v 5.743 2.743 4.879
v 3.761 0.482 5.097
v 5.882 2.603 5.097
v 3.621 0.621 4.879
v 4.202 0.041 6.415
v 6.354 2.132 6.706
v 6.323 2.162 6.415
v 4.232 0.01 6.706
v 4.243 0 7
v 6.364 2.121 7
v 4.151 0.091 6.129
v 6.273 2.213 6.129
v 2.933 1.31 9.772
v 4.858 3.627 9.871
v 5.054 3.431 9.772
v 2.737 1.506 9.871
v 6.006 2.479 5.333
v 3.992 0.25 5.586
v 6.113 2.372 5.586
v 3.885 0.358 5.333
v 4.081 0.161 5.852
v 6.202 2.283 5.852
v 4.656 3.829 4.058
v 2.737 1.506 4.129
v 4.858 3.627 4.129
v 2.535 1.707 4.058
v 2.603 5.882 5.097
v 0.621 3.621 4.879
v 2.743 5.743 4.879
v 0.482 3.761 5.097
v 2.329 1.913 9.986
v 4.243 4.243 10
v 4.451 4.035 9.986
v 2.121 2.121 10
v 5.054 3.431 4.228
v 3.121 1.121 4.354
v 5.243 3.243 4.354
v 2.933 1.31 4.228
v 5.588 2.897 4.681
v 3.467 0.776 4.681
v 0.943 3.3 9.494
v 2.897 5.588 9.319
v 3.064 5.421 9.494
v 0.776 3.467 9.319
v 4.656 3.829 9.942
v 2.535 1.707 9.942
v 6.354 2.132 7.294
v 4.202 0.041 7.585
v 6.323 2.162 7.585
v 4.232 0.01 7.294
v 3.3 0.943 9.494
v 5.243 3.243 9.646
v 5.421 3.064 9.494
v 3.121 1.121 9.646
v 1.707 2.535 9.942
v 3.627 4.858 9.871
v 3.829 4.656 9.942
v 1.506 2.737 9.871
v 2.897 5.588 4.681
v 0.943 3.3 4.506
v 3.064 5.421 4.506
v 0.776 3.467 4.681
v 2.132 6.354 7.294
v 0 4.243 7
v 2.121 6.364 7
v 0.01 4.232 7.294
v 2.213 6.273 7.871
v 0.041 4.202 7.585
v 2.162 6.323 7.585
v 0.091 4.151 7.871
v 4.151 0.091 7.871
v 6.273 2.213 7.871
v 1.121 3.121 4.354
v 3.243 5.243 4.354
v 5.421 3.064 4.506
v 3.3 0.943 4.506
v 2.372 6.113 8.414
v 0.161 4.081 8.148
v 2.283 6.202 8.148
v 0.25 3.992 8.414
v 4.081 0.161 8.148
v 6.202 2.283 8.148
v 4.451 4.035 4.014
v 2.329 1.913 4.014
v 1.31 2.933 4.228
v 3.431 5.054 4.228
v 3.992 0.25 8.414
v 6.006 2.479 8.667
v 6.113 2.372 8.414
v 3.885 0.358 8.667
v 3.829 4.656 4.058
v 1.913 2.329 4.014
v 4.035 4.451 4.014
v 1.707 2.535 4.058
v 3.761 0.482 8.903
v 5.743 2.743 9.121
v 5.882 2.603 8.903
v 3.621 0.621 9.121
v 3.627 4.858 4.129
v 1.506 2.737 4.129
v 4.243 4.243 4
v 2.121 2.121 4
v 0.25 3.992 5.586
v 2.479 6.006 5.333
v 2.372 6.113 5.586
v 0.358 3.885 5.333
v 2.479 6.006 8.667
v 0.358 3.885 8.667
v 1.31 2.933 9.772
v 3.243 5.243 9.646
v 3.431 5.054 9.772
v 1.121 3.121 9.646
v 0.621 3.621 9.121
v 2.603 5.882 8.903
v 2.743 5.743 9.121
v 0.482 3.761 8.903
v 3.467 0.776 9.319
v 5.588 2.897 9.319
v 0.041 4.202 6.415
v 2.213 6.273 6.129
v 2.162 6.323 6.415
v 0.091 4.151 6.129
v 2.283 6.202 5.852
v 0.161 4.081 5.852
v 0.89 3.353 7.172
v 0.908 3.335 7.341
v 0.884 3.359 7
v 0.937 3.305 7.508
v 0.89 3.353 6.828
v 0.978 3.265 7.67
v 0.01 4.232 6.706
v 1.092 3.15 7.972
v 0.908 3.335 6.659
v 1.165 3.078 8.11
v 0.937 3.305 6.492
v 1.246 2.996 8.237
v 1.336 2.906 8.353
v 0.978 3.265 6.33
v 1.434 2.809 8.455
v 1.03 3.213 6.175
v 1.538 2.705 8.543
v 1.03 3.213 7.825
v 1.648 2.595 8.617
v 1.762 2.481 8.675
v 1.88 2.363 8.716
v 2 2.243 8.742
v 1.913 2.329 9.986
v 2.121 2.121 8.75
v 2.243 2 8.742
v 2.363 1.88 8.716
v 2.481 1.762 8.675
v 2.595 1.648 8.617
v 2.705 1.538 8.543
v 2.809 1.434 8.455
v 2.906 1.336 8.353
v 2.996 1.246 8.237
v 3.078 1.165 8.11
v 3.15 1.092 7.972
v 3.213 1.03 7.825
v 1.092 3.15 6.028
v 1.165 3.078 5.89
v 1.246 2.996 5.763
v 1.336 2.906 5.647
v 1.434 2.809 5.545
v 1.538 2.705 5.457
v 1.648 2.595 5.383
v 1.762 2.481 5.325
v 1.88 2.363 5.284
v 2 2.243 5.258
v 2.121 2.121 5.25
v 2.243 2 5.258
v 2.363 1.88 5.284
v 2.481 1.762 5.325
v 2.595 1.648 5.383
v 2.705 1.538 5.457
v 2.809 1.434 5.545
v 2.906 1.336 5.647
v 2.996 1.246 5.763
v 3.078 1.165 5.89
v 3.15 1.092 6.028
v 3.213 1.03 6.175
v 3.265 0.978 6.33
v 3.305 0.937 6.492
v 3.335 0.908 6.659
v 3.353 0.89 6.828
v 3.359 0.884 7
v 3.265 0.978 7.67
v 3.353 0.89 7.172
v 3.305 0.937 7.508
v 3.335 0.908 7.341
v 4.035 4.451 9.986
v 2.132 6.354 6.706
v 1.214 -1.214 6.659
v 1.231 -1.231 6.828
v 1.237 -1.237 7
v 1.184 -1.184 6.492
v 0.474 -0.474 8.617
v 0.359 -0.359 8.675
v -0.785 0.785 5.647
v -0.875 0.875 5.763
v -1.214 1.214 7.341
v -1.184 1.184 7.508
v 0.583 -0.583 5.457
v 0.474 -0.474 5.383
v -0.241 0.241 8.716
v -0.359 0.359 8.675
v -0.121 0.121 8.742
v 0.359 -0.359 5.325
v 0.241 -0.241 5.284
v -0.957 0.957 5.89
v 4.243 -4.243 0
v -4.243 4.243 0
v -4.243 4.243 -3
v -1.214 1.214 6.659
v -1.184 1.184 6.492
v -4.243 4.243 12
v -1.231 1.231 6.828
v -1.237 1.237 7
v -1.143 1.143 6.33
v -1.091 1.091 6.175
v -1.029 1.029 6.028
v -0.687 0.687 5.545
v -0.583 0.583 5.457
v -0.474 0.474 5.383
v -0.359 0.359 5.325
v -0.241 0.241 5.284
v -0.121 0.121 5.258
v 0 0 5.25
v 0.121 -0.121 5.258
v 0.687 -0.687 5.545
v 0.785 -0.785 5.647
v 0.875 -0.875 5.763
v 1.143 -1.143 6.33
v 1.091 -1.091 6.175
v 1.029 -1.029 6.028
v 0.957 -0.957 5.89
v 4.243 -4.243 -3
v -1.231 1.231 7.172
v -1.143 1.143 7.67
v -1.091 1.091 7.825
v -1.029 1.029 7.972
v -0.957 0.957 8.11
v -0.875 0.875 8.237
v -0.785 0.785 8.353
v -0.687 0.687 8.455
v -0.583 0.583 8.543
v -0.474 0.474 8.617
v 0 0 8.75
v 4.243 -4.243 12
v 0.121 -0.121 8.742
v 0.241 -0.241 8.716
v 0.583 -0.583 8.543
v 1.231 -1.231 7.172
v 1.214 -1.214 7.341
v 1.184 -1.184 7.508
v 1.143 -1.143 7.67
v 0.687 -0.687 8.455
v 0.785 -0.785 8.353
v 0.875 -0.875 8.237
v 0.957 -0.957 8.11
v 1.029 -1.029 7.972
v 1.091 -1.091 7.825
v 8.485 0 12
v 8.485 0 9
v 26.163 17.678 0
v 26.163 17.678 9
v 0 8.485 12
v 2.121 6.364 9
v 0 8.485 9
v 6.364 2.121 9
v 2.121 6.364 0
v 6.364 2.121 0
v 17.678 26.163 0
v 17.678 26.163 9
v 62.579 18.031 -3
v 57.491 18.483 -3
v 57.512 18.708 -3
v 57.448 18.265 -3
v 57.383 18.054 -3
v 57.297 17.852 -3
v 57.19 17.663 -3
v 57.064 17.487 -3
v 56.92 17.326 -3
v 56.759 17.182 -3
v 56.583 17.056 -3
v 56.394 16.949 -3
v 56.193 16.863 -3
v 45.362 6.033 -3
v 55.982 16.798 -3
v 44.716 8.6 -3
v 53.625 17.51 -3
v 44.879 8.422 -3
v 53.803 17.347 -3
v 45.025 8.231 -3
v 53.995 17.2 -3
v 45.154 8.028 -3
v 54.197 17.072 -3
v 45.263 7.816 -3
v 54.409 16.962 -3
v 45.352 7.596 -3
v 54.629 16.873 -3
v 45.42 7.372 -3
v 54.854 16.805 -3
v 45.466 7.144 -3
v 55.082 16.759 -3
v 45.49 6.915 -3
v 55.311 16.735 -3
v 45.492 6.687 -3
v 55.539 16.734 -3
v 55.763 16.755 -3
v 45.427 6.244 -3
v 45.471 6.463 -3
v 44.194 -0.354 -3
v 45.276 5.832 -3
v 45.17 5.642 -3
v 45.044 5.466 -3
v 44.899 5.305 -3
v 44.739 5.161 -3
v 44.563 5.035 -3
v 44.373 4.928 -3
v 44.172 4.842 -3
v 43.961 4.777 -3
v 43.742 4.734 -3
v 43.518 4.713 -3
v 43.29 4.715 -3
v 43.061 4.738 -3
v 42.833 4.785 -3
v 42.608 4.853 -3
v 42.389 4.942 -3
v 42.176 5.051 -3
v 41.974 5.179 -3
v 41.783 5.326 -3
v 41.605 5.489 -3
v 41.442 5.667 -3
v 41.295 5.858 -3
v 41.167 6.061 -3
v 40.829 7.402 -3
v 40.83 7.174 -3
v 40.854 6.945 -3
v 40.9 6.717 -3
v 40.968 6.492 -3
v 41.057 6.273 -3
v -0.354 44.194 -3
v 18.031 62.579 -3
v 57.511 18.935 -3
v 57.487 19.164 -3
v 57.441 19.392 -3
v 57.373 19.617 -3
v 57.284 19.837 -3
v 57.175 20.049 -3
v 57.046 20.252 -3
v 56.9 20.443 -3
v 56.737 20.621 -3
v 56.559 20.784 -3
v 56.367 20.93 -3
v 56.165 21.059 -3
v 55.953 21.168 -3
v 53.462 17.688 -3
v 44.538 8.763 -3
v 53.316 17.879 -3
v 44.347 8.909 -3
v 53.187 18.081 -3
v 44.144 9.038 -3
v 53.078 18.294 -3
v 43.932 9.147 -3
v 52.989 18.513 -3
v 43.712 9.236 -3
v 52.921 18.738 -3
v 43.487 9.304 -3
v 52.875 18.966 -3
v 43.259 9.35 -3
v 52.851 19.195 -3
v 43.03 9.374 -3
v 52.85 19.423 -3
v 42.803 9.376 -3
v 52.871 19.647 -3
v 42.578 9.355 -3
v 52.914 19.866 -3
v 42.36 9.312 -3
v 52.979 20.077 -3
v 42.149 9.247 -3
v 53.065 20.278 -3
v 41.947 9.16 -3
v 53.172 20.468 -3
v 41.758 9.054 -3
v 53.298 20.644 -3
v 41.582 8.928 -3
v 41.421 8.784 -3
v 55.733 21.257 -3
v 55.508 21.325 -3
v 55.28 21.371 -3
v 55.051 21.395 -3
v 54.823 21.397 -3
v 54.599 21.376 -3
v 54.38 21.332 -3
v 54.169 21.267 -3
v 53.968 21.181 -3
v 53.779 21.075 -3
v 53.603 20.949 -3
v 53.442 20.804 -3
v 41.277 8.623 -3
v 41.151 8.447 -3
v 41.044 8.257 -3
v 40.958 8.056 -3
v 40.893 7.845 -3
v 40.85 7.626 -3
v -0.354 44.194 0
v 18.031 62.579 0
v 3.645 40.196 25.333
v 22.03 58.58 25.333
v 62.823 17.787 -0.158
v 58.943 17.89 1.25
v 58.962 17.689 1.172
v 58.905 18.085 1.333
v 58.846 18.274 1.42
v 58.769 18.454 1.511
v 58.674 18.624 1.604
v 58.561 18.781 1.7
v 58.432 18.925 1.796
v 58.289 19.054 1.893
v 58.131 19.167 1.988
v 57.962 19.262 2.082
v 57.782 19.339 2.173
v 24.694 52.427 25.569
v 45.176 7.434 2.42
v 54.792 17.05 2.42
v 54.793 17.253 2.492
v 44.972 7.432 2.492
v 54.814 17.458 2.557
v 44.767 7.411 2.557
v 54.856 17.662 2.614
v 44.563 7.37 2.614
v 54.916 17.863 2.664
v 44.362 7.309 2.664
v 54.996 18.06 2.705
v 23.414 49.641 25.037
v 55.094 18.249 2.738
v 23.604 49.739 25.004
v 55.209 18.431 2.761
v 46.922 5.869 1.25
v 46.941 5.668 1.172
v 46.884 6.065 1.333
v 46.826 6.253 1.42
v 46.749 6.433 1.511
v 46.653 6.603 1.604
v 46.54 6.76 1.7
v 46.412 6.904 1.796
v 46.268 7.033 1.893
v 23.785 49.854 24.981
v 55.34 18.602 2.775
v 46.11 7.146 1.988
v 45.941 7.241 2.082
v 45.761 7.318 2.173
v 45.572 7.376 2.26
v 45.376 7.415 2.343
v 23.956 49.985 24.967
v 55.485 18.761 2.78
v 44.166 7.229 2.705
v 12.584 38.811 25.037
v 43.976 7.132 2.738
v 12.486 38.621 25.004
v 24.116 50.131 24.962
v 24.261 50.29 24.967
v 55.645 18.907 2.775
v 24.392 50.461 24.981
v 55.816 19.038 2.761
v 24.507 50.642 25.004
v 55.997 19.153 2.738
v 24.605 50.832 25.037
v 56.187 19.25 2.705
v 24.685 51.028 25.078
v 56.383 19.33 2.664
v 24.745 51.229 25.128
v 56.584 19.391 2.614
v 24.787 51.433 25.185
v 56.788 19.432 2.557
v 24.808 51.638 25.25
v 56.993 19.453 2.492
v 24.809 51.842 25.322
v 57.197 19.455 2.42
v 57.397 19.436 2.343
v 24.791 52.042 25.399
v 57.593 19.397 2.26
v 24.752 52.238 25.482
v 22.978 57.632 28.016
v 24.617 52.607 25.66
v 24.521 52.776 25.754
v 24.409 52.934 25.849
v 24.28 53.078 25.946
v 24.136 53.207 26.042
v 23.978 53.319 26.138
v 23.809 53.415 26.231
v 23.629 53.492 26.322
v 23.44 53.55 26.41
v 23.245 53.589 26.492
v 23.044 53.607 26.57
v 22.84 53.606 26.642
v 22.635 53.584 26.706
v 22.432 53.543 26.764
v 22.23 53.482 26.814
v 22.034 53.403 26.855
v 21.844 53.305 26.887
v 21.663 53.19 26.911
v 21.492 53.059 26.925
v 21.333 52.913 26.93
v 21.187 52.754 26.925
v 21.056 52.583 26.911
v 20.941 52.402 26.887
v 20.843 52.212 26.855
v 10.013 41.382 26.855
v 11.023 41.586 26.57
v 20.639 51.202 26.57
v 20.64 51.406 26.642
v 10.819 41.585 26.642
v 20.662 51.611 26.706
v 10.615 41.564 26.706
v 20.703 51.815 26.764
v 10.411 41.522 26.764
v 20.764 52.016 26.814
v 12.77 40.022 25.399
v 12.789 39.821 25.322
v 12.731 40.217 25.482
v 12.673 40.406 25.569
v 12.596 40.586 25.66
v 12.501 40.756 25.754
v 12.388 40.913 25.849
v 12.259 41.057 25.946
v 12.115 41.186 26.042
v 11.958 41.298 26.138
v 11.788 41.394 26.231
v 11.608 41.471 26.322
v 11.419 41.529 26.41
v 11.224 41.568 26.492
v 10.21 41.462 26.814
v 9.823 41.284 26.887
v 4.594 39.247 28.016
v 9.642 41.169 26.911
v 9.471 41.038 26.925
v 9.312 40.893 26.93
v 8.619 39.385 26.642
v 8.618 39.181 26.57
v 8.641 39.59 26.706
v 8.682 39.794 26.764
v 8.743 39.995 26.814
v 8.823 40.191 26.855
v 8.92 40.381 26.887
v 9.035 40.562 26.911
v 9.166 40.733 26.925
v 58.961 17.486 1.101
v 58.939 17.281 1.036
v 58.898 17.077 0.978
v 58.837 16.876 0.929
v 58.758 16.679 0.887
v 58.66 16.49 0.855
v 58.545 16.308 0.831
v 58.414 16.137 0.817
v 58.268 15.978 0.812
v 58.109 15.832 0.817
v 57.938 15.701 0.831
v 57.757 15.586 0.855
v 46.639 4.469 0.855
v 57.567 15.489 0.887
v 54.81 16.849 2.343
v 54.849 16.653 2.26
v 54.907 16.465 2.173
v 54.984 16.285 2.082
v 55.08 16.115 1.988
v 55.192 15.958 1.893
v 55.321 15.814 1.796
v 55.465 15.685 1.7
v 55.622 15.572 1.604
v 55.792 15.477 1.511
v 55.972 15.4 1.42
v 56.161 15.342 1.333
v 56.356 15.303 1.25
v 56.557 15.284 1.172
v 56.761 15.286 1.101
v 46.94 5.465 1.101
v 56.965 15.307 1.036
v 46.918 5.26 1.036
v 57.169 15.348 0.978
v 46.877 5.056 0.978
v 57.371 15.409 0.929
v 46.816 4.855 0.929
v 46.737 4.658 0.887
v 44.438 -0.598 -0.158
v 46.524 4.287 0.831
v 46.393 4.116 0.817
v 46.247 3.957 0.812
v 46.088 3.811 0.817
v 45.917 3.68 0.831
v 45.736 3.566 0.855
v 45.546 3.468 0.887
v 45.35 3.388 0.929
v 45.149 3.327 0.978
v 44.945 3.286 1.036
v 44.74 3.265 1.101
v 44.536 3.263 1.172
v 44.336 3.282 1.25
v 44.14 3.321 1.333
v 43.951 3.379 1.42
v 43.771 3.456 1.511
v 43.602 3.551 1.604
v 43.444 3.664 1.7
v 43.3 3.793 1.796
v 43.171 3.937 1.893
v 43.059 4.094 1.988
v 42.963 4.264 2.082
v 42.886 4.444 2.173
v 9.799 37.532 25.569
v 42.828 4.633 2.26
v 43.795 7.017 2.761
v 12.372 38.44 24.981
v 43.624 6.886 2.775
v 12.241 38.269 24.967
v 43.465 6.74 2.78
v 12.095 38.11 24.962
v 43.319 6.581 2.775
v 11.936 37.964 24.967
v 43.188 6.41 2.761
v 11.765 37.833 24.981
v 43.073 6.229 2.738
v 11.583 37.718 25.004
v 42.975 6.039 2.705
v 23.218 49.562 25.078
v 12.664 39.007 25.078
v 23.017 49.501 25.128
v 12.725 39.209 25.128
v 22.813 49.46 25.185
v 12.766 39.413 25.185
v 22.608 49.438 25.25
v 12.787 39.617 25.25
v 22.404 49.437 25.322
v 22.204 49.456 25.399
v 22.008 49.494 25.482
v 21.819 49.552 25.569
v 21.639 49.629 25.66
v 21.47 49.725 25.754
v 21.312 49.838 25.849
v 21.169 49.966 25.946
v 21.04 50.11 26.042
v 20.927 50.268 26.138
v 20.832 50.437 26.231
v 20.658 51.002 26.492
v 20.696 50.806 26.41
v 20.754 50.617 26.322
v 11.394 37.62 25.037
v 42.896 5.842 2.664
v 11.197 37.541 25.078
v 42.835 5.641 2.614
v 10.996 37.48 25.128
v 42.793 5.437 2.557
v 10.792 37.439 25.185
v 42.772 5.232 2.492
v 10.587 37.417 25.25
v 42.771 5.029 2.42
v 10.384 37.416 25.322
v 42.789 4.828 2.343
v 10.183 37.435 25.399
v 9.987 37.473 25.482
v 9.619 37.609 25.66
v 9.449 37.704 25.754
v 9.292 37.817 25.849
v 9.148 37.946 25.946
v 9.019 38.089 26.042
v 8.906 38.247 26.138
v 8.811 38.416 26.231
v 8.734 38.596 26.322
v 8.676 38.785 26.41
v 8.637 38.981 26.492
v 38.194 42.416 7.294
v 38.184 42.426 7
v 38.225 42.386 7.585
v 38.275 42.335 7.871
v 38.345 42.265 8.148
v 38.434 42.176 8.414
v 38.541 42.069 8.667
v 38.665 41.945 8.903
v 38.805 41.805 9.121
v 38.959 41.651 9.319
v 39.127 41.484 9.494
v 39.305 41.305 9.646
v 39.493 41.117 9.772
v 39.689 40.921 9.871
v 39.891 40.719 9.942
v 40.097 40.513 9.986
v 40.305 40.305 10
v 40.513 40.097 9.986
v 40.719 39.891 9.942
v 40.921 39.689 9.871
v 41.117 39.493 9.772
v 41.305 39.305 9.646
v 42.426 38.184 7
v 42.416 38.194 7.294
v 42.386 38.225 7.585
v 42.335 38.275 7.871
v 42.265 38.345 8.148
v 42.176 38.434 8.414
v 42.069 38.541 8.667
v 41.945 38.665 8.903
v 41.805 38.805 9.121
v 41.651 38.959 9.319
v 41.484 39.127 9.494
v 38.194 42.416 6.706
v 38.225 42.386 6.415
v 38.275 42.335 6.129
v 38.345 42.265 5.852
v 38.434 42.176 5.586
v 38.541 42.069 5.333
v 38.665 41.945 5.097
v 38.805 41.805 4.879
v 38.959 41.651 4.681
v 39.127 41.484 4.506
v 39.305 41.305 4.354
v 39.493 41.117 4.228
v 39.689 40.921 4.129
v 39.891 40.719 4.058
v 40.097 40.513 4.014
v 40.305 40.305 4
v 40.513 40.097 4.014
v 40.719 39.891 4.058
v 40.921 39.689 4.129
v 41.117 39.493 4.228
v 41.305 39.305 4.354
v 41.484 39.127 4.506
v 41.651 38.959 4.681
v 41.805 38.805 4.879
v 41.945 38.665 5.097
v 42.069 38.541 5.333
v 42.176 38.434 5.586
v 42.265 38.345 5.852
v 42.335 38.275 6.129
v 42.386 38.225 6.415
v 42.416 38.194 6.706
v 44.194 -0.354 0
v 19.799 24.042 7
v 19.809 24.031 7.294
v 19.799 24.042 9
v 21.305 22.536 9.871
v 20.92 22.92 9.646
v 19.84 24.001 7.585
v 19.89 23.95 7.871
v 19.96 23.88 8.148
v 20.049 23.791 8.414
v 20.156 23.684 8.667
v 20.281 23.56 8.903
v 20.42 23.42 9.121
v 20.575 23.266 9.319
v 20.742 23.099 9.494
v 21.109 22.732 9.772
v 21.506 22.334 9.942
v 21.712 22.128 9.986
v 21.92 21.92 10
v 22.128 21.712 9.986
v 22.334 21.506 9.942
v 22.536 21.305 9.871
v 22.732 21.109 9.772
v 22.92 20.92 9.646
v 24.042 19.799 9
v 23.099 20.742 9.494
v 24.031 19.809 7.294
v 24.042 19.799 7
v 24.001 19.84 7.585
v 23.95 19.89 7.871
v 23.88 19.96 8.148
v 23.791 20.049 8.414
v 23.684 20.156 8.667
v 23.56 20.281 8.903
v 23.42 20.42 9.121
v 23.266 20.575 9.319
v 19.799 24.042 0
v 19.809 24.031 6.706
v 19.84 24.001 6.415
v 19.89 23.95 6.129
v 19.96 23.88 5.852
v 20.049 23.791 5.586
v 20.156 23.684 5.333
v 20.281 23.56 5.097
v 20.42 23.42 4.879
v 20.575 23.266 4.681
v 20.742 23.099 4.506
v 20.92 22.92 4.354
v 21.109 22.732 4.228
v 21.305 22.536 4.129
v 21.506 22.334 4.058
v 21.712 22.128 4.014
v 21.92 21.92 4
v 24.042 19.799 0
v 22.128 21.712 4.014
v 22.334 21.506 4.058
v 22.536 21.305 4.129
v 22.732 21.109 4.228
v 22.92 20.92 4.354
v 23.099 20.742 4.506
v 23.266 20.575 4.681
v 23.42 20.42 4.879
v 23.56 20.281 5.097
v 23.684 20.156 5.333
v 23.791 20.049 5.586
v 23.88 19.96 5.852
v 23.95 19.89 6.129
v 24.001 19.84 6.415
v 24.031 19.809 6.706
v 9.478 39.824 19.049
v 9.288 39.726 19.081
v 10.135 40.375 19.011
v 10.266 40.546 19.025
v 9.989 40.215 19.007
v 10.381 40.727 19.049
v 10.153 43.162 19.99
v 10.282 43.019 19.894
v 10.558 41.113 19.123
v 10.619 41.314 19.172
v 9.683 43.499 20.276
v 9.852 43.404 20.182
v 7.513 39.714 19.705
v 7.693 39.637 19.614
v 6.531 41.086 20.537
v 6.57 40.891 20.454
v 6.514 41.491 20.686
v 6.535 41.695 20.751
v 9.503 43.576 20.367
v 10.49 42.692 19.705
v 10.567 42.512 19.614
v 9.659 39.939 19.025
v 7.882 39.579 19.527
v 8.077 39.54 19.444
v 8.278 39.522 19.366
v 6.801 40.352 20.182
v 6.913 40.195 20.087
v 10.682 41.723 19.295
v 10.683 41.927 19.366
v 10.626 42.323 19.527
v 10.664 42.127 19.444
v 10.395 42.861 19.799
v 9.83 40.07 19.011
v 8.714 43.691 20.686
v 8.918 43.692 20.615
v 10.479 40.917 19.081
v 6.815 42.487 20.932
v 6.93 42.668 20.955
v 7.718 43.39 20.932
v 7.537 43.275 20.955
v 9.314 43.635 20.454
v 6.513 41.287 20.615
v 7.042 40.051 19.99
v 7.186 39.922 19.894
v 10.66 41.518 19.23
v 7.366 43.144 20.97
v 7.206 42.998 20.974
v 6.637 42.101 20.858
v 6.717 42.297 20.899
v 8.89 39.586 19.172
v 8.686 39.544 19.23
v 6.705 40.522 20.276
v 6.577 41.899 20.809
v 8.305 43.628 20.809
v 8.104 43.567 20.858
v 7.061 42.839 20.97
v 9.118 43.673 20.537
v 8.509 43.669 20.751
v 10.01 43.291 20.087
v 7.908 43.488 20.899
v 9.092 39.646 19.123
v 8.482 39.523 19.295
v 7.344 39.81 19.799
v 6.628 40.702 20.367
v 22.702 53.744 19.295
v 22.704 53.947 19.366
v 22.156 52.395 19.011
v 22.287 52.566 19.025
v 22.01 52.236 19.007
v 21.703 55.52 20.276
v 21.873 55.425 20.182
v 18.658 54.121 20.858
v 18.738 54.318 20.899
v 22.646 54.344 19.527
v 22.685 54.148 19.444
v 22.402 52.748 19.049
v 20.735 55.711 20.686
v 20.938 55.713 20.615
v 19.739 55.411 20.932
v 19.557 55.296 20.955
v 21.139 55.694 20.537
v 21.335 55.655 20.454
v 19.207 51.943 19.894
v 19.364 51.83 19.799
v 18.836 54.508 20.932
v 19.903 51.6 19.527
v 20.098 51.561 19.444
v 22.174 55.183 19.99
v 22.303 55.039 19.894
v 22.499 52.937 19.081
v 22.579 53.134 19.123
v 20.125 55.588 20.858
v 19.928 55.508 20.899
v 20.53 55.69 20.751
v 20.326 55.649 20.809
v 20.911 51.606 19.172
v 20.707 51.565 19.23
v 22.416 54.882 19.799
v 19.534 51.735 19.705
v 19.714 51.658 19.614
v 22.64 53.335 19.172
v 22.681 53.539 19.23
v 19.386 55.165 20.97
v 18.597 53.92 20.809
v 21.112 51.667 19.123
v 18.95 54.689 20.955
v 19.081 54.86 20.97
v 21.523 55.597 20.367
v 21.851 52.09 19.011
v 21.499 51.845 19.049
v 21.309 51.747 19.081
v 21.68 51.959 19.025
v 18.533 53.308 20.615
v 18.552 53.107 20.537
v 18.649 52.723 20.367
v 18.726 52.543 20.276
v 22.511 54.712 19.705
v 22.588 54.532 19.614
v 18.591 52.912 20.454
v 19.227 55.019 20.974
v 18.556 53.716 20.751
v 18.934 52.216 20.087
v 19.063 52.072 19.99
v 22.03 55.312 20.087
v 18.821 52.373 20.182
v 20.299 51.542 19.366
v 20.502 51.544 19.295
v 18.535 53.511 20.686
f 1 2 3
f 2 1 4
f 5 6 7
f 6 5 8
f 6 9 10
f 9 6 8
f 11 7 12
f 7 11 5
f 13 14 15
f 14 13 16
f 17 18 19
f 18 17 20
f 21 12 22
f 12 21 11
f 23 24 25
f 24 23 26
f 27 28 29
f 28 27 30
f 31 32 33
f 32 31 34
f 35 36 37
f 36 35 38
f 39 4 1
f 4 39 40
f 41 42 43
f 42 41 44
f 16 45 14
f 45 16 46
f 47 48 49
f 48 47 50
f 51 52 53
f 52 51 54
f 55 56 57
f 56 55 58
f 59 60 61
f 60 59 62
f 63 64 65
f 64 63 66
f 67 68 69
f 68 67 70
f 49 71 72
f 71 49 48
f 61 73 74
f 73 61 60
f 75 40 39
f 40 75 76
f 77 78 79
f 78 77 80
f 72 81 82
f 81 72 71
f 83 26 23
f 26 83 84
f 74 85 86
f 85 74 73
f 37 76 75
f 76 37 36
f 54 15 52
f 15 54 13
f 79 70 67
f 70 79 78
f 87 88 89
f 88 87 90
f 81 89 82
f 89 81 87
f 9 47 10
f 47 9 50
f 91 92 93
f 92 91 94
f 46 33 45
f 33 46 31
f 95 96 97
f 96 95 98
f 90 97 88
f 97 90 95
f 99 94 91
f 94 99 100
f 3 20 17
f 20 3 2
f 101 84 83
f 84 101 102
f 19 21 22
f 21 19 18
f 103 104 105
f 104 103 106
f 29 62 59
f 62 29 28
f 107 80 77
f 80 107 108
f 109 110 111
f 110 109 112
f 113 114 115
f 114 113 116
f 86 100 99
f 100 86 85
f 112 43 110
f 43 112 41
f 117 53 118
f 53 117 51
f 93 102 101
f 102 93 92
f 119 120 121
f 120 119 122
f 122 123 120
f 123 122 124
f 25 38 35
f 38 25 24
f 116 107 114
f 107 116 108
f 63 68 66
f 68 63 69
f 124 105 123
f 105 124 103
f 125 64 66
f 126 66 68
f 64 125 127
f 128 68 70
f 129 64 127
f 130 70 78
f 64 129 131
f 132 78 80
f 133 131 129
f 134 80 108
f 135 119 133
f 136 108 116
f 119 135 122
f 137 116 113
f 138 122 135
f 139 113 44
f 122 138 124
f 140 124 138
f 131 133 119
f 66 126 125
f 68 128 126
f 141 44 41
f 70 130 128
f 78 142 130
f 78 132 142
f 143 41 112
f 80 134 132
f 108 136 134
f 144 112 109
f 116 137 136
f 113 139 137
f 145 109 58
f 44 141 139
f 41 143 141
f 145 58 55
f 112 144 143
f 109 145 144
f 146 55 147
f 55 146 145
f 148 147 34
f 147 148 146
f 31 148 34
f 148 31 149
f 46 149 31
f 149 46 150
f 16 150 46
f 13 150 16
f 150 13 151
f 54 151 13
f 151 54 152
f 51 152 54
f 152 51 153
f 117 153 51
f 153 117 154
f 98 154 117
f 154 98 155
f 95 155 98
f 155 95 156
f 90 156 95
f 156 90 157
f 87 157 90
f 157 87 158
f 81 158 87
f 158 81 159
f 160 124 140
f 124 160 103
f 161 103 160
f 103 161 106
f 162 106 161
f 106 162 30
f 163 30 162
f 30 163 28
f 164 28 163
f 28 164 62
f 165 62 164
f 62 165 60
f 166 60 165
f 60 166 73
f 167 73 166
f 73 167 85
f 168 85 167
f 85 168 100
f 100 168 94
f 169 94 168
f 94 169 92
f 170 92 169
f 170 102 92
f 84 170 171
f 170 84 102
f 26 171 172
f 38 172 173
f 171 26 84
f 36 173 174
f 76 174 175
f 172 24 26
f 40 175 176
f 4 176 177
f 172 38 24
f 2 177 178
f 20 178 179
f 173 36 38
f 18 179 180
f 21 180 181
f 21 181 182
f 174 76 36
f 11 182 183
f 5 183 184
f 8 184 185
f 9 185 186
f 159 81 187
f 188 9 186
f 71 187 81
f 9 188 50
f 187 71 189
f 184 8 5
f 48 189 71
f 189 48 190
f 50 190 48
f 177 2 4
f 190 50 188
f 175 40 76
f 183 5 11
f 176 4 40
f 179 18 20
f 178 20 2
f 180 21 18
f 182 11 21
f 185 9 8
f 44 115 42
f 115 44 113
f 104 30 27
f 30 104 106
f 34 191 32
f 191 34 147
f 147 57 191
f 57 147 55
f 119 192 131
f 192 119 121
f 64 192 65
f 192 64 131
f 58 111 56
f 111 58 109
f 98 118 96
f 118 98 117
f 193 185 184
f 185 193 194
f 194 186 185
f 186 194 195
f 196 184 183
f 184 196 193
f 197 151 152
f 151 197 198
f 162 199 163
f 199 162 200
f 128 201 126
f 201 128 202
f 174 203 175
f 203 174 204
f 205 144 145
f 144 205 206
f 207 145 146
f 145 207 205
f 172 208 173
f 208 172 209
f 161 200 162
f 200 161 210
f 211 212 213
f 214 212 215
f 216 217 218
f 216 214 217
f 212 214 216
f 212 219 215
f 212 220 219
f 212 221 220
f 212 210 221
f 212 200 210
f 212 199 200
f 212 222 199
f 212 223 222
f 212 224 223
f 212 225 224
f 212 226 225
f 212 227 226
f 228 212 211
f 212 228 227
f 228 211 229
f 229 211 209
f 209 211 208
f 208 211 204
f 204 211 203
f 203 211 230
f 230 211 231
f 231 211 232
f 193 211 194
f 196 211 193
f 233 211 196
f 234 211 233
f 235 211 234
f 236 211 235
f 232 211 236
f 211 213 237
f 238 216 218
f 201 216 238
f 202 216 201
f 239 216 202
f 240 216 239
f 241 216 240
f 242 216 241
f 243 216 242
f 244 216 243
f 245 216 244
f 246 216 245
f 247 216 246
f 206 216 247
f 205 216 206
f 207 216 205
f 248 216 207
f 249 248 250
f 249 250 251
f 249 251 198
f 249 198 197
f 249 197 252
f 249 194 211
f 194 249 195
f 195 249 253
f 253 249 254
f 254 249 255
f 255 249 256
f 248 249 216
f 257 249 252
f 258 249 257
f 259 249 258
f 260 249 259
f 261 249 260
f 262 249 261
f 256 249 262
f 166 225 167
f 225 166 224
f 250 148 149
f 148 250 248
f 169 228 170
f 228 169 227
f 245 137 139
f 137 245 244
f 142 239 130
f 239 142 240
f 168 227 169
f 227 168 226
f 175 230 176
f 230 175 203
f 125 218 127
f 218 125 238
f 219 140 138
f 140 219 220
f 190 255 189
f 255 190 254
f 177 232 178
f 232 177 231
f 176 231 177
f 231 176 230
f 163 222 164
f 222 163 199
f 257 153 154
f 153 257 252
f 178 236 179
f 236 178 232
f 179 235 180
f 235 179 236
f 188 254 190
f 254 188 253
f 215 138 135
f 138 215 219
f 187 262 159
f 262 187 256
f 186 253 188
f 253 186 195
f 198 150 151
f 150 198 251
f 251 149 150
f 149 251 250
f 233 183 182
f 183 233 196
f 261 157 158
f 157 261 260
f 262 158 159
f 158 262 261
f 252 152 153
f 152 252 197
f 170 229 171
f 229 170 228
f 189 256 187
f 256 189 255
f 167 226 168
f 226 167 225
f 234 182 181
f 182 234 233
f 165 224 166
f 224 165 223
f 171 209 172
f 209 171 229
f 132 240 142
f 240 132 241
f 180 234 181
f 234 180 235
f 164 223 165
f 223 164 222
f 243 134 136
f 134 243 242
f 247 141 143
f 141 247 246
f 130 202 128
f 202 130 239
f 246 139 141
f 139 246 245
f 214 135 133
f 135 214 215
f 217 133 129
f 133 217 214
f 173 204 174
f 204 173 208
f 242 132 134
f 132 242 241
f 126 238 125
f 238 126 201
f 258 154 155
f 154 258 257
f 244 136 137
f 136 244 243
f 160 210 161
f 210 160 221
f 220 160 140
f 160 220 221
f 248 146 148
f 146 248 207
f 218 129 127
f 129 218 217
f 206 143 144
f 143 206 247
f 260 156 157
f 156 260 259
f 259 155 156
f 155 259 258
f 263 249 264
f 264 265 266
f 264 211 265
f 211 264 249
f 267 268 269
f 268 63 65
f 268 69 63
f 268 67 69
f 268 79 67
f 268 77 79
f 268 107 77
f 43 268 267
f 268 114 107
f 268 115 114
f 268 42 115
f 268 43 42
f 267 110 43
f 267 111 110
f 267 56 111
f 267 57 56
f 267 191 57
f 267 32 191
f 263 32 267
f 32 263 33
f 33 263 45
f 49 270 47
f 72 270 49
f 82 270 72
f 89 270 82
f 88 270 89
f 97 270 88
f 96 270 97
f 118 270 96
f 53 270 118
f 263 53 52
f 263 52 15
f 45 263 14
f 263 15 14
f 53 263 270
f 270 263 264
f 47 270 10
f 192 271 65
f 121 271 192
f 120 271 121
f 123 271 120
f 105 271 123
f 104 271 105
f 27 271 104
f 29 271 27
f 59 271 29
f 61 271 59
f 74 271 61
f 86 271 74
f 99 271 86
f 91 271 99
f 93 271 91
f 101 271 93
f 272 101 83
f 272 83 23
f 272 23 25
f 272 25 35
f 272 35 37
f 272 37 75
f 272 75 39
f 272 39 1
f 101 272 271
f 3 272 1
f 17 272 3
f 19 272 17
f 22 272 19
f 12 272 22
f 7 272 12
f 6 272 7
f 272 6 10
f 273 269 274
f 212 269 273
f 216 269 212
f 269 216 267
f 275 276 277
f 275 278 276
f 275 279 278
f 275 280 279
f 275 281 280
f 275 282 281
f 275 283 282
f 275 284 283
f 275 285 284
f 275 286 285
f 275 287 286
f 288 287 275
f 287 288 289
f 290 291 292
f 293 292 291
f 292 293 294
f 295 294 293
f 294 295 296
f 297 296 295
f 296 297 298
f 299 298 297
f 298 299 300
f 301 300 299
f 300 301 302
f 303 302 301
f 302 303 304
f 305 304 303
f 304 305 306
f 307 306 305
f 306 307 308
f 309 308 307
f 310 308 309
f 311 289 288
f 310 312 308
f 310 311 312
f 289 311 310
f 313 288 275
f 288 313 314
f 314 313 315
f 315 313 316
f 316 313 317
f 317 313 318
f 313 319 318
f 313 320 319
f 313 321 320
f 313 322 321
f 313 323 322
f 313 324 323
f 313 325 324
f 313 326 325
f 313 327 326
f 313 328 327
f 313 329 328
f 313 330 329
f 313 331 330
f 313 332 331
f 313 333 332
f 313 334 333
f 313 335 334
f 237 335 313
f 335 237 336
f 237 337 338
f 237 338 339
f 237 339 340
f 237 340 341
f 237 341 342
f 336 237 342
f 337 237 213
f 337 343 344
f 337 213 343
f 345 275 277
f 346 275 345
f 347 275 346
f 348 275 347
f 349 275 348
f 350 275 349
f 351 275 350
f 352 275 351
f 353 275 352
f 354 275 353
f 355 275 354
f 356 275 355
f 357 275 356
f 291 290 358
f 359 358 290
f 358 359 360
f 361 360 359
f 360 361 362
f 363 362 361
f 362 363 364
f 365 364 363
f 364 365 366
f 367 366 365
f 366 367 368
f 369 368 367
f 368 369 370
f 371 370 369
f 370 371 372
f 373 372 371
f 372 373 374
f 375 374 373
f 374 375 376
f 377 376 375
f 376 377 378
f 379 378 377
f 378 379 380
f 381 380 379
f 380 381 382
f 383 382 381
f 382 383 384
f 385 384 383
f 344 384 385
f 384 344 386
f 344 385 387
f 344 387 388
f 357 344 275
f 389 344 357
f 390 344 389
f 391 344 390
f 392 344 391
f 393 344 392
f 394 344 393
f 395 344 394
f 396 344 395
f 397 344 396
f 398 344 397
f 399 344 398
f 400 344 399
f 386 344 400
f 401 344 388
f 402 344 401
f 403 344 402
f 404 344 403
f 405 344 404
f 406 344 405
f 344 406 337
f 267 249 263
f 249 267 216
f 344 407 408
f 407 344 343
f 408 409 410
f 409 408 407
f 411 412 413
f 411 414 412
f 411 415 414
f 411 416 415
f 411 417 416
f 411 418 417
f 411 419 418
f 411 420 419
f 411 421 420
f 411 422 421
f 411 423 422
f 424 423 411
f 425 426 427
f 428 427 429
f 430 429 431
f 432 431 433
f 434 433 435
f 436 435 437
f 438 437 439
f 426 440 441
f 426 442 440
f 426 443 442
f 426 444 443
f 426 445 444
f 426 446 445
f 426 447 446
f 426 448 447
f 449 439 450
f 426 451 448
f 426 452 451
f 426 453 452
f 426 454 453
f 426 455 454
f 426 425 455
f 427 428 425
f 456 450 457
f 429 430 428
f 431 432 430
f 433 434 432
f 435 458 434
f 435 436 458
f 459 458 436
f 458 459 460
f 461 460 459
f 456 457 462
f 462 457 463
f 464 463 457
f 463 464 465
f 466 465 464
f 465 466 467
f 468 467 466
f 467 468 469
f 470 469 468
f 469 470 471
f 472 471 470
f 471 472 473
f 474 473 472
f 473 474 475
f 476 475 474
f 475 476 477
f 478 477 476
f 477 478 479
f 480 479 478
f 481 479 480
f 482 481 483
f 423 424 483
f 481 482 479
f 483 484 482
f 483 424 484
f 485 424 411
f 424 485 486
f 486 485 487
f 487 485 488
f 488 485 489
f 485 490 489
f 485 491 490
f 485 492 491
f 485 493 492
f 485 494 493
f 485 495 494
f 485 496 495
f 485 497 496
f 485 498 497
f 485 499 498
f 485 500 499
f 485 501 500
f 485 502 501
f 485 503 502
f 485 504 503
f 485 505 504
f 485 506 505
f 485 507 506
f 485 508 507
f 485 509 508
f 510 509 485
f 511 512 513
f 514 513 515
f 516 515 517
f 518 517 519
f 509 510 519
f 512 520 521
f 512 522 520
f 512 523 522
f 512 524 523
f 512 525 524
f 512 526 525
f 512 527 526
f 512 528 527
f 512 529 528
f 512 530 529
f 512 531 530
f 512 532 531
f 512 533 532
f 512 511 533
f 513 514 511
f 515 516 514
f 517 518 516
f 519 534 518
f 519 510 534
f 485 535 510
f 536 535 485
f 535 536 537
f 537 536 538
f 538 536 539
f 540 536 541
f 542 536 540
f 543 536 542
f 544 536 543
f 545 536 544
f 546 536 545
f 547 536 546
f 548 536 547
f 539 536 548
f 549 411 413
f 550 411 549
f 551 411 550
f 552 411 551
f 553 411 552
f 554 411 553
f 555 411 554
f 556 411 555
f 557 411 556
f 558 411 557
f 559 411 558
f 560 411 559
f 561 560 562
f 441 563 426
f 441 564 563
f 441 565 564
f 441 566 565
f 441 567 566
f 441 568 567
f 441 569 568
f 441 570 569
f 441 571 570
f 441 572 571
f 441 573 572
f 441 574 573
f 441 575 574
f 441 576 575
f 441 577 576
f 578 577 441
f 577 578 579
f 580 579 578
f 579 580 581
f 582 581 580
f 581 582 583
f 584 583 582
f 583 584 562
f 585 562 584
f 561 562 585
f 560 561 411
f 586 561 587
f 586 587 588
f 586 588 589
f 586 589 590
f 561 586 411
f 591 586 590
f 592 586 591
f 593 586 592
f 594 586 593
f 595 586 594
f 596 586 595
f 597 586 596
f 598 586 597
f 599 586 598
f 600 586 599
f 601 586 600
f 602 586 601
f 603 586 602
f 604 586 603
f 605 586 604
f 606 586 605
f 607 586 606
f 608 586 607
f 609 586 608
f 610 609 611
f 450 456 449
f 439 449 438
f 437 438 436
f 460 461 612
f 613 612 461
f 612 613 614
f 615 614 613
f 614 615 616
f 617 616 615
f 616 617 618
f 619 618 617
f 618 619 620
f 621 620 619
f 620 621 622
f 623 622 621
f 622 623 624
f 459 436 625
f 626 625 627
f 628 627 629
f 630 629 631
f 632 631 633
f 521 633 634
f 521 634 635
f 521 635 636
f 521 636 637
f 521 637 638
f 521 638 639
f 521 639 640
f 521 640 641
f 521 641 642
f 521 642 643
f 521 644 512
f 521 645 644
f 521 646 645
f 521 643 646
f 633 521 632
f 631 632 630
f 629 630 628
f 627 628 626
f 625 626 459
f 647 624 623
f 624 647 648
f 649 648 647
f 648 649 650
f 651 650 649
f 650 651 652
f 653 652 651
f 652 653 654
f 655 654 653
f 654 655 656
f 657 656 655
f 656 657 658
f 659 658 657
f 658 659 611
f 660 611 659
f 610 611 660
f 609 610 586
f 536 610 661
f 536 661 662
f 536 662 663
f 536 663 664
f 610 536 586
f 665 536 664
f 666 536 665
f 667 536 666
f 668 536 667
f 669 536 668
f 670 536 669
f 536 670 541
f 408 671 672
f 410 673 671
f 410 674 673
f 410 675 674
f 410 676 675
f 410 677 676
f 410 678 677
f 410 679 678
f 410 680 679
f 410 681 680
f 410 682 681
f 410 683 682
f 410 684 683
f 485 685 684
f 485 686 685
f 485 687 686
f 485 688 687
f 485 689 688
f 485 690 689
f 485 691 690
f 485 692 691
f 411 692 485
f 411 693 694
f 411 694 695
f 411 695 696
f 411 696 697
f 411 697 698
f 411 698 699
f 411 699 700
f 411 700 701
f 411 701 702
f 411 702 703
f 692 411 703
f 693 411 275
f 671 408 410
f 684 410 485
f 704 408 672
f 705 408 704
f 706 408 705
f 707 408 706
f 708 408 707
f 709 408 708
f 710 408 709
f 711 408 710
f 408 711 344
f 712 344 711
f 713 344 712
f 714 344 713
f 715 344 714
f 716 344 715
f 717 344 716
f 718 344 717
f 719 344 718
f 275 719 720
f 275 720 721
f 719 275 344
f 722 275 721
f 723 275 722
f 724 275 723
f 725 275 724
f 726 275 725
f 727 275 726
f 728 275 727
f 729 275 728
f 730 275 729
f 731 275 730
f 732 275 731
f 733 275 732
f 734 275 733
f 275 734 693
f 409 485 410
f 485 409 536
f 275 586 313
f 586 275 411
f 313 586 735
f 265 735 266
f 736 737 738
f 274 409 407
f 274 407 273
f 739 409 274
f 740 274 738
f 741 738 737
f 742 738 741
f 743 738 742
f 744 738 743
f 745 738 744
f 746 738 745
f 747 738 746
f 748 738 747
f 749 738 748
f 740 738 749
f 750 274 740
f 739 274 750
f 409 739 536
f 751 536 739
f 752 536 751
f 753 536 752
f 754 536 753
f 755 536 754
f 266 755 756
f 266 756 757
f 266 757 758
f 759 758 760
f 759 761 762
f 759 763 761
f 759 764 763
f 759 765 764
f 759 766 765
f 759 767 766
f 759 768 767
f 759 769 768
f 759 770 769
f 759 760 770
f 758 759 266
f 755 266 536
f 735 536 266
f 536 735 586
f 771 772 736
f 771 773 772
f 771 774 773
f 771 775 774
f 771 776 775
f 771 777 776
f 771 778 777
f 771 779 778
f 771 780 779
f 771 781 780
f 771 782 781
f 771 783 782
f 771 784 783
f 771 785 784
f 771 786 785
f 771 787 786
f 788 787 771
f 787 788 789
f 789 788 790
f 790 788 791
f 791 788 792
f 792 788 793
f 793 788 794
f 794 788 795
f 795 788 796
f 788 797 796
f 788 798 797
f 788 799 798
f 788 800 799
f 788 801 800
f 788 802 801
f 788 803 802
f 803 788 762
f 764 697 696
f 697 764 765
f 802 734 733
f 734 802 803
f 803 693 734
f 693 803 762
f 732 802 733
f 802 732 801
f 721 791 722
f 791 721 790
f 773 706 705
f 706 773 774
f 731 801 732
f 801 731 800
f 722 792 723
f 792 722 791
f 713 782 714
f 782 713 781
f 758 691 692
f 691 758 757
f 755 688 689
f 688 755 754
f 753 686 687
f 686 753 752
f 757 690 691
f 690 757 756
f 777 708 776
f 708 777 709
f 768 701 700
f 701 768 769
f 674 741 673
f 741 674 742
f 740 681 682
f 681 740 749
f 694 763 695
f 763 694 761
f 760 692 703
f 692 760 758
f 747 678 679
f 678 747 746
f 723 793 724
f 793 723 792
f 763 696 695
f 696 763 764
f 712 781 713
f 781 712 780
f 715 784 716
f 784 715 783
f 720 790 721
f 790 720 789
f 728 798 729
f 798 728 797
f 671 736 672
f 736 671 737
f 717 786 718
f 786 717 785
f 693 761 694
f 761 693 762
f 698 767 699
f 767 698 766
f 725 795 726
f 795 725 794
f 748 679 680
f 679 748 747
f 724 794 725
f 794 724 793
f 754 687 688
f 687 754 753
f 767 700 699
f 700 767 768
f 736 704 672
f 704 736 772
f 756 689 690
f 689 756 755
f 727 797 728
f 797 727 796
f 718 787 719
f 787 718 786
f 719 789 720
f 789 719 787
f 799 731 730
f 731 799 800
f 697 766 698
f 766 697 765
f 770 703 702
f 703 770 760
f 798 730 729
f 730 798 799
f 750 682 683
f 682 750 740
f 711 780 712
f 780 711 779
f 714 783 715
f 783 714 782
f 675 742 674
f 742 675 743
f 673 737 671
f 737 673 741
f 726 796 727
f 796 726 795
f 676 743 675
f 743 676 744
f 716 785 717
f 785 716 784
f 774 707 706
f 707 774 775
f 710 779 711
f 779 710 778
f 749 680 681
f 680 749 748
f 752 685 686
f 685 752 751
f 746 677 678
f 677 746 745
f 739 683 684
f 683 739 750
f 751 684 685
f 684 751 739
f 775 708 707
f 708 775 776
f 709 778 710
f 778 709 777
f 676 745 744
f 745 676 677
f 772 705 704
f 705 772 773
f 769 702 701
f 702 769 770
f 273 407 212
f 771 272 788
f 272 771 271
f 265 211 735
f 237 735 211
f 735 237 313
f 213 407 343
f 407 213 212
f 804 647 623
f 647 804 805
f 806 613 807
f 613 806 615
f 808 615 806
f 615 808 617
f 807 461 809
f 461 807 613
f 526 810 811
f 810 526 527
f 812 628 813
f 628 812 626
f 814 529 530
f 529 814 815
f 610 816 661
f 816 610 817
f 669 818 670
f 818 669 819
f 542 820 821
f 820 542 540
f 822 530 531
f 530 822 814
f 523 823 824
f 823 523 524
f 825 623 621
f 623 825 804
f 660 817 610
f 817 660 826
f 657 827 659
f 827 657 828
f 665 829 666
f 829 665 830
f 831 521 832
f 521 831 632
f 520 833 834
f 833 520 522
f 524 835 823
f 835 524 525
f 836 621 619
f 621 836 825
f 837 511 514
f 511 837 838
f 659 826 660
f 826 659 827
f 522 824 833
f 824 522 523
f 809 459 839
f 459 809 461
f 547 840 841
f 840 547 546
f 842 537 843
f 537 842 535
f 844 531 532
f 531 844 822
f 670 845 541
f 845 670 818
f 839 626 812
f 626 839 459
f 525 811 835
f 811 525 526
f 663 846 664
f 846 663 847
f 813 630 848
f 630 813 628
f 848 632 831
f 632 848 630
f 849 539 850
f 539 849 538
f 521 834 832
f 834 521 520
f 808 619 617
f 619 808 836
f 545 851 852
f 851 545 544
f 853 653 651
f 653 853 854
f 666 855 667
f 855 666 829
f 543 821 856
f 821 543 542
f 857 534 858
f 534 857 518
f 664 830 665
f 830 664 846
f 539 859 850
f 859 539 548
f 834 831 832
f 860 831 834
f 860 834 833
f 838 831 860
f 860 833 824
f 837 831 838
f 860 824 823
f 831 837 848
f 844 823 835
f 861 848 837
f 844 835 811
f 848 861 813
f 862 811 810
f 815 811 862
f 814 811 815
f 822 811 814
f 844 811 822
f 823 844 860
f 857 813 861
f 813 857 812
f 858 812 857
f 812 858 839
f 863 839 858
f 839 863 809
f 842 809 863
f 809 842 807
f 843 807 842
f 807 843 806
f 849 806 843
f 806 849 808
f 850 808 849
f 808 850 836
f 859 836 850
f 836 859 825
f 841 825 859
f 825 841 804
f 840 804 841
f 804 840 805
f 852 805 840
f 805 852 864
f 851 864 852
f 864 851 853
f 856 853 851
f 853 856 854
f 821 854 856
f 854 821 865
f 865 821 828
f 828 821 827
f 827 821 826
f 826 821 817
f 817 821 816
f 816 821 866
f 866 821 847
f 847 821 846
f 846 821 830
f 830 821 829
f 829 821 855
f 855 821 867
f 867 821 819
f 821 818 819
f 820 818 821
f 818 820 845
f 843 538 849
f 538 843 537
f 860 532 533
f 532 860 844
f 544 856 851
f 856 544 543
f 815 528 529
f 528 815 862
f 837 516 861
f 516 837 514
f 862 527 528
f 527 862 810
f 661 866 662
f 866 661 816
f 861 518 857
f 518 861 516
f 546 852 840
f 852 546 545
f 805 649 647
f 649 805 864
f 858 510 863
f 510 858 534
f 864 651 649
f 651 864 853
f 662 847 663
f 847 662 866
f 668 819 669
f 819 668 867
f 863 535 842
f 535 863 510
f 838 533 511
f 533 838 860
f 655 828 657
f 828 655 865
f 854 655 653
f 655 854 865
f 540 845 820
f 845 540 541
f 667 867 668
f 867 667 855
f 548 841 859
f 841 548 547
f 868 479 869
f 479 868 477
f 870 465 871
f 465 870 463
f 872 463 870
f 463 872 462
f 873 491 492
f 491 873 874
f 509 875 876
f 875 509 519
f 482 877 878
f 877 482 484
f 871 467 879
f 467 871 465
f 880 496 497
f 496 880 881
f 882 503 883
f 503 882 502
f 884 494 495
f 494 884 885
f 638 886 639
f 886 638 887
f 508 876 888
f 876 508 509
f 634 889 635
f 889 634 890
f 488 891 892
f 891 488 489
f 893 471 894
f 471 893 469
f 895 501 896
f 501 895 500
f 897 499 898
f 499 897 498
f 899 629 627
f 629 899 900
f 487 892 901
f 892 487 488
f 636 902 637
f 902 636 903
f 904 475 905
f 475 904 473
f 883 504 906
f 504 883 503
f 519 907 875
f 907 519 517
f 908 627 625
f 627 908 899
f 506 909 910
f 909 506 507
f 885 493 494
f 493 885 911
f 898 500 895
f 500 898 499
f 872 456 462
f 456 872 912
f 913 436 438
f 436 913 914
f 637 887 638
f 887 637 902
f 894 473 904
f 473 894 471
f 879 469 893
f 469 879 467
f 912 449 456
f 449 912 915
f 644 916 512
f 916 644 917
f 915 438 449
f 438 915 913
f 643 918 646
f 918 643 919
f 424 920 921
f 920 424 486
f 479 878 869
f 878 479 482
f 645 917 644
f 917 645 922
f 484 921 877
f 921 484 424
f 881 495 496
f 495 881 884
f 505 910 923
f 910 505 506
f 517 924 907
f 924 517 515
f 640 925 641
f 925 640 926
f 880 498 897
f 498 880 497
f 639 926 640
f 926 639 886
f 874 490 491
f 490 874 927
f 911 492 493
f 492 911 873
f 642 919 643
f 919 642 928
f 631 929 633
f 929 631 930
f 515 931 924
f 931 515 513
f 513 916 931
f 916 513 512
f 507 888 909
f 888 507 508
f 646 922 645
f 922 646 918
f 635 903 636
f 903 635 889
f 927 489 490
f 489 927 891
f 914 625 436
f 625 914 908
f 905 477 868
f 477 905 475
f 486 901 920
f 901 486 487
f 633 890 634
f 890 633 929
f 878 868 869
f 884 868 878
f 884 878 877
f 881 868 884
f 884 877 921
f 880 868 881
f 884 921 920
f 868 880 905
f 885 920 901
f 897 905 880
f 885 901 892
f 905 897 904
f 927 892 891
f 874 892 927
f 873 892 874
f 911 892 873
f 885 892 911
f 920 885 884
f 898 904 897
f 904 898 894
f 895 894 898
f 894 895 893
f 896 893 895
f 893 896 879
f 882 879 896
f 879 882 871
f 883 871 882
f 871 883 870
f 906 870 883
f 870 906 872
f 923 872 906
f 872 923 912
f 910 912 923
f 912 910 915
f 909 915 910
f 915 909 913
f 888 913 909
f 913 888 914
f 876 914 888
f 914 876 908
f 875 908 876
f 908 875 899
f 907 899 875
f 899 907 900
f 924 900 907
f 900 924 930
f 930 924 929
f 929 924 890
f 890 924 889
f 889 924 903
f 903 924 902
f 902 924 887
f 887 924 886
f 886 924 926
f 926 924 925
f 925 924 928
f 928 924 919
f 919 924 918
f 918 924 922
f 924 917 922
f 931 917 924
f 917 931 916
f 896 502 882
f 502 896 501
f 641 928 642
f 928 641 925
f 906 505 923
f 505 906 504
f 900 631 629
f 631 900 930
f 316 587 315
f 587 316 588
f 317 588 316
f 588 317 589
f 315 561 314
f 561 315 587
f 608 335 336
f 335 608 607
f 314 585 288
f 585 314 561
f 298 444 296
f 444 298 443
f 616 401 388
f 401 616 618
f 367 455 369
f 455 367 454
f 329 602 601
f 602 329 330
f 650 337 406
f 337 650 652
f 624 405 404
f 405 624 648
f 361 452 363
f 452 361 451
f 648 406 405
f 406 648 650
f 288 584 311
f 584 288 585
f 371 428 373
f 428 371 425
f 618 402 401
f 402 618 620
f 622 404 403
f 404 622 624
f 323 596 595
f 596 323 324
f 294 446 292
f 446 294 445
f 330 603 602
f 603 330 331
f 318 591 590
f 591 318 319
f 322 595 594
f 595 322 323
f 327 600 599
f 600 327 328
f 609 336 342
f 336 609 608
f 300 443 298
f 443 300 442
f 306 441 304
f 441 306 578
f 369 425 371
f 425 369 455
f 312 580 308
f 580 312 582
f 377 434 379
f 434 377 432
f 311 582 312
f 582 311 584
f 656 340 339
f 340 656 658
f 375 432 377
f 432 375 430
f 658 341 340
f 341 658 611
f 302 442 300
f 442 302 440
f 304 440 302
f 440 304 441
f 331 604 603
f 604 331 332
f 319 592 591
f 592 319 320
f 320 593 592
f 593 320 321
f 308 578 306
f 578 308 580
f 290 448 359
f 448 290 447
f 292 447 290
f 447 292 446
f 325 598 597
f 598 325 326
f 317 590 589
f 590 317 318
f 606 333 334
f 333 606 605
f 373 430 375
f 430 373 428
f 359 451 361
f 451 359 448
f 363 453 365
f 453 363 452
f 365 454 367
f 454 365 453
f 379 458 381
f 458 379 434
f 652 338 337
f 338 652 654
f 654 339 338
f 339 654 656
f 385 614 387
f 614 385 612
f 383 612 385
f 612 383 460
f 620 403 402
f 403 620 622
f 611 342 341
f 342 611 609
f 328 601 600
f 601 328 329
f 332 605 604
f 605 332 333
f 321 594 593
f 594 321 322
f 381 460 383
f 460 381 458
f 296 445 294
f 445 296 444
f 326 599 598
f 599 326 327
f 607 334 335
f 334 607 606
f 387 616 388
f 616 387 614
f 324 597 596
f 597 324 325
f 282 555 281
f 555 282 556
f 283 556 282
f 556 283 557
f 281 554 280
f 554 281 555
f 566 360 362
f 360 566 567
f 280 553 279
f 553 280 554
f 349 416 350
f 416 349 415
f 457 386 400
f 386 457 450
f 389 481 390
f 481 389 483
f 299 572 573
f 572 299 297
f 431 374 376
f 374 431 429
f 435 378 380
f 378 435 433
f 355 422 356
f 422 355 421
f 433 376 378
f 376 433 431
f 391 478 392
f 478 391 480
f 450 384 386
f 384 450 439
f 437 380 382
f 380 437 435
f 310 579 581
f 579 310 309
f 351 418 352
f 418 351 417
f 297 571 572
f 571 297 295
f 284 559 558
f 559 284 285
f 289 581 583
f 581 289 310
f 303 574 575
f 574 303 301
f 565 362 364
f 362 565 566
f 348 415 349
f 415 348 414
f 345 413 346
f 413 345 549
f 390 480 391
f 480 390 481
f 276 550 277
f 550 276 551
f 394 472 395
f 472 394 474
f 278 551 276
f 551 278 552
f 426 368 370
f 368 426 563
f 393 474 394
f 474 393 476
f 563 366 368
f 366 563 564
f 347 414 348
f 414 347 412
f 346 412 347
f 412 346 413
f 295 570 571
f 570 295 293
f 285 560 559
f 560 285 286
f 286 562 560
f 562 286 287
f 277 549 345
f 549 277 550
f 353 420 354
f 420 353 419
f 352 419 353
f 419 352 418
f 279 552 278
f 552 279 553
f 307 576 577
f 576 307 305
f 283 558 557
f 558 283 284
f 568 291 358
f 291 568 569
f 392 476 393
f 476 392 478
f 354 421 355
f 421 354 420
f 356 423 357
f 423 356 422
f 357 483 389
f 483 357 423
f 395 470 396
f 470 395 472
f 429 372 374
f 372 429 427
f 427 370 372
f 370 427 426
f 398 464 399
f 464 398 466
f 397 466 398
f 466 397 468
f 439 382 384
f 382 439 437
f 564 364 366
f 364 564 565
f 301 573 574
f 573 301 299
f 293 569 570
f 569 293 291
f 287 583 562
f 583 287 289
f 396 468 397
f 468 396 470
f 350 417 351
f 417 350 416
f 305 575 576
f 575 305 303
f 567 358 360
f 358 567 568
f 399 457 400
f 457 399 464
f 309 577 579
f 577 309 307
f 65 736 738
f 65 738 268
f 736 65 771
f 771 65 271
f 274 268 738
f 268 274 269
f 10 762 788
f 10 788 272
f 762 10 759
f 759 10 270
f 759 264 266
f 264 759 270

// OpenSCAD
/*
Copyright 2024, Pavlos Iliopoulos.

    2020 Aplic Cam Mount is free software: you can redistribute it and/or modify it under the terms of the GNU General Public License as published by the Free Software Foundation, either version 3 of the License, or (at your option) any later version.

    2020 Aplic Cam Mount is distributed in the hope that it will be useful, but WITHOUT ANY WARRANTY; without even the implied warranty of MERCHANTABILITY or FITNESS FOR A PARTICULAR PURPOSE. See the GNU General Public License for more details.

    You should have received a copy of the GNU General Public License along with this program. If not, see <https://www.gnu.org/licenses/>. 

The author does not hold any copyright or has any affiliation with aplic and/or its products.
    */



$fn = 64;

// Wall thickness
wall_thickness = 3;

// Hole distances
hole_distance_x = 54;
hole_distance_y = 17;
corrective_hole_x_offset = 0.8;

// Dimensions of the wall
wall_l = hole_distance_x + 3 * wall_thickness;
wall_w = hole_distance_y + 3 * wall_thickness;

// Camera elevation
cam_elevation = 25; // set to 10 for shortened version (inverse mounting on gantry)

// Dimensions of the anchor
anchor_l = 15;
anchor_w = 12;
anchor_h = 6;
anchor_screw_hole_offset = 2.5;
anchor_screw_d = 3.5;
hex_hole_z_offset = 3;

// Screw dimensions
screw_length = 10;
screw_receiver_d = 6;

// Hex hole dimensions
hex_hole_y = -7;
hex_hole_d = 6;

// Support dimensions
support_w = anchor_l - 2 * wall_thickness;
support_x_offset = (anchor_w - wall_thickness) / 2;

// Heat insert dimensions
heat_insert_d = 4.4;
heat_insert_thickness = 13;

// Calculate the camera viewing angle
cam_viewing_angle_x = atan(74 / 148); // arctan( (distance between 2 rods/2) / (distance from back + stage side/2) )
echo("CAM VIEWING ANGLE x:", cam_viewing_angle_x);

// Define the solid anchor module
module solid_anchor() {
    anchor_l = 15;
    anchor_w = 12;
    anchor_h = 6;

    // Length is 15mm, width is 12mm
    difference() {
        cube ([anchor_w, anchor_l, anchor_h]);
        translate([anchor_w/2, anchor_l/2-anchor_screw_hole_offset, 0]) {
            translate([0,0, hex_hole_z_offset]) {
                #cylinder(h = anchor_h , d = hex_hole_d);
            }

            #cylinder(h = anchor_h, d = anchor_screw_d);
        }
    }
}

// Define the back panel module
module back_panel() {
    hull() {
        translate([0, wall_thickness / 2, anchor_h / 2]) {
            cube([anchor_w, wall_thickness, anchor_h], center = true);
        }
        translate([0, wall_thickness / 2, wall_w / 2 + anchor_h + cam_elevation]) {
            cube([wall_l, wall_thickness, wall_w], center = true);
        }
    }
}

// Define the inserts module
module inserts() {
    translate([0, 0, wall_w / 2 + anchor_h + cam_elevation]) {
        translate([wall_thickness, -(wall_l * sin(cam_viewing_angle_x) / 2), 0]) {
            rotate([0, 0, cam_viewing_angle_x]) {
                for (x = [-1, 1]) {
                    for (y = [-1, 1]) {
                        translate([corrective_hole_x_offset + x * hole_distance_x / 2, heat_insert_thickness / 2, y * hole_distance_y / 2]) {
                            rotate([90, 0, 0]) {
                                cylinder(h = heat_insert_thickness, d = heat_insert_d);
                            }
                        }
                    }
                }
            }
        }
    }
}

module rotated_wall() {
    translate([wall_thickness, -(wall_l * sin(cam_viewing_angle_x) / 2), 0]) {
        rotate([0, 0, cam_viewing_angle_x]) {
            cube([wall_l, wall_thickness, wall_w], center = true);
        }
    }
}

module cam_mount() {
    difference() {
        translate([0, wall_thickness / 2, wall_w / 2 + anchor_h + cam_elevation]) {
            hull() {
                #cube([wall_l, wall_thickness, wall_w], center=true);
                #rotated_wall();
            }
        }

        translate([0, hex_hole_y, 0]) {
        #cylinder(h = anchor_h + cam_elevation + wall_w, d = hex_hole_d);
        }
    }
}

module supports() {
    for (i = [-1, 1]) {
        translate([i * support_x_offset, -support_w / 2, (cam_elevation + anchor_h) / 2]) {
            cube([wall_thickness, support_w, cam_elevation + anchor_h], center = true);
        }
    }
}

module aplic_complete_mount() {
    translate([-anchor_w / 2, wall_thickness - anchor_l, 0]) {
        solid_anchor();
    }
    difference() {
        union() {
            back_panel();
            cam_mount();
        }

        #inserts ();
    }

    supports();
}

rotate([270, 0, -45]){
    aplic_complete_mount();
}
